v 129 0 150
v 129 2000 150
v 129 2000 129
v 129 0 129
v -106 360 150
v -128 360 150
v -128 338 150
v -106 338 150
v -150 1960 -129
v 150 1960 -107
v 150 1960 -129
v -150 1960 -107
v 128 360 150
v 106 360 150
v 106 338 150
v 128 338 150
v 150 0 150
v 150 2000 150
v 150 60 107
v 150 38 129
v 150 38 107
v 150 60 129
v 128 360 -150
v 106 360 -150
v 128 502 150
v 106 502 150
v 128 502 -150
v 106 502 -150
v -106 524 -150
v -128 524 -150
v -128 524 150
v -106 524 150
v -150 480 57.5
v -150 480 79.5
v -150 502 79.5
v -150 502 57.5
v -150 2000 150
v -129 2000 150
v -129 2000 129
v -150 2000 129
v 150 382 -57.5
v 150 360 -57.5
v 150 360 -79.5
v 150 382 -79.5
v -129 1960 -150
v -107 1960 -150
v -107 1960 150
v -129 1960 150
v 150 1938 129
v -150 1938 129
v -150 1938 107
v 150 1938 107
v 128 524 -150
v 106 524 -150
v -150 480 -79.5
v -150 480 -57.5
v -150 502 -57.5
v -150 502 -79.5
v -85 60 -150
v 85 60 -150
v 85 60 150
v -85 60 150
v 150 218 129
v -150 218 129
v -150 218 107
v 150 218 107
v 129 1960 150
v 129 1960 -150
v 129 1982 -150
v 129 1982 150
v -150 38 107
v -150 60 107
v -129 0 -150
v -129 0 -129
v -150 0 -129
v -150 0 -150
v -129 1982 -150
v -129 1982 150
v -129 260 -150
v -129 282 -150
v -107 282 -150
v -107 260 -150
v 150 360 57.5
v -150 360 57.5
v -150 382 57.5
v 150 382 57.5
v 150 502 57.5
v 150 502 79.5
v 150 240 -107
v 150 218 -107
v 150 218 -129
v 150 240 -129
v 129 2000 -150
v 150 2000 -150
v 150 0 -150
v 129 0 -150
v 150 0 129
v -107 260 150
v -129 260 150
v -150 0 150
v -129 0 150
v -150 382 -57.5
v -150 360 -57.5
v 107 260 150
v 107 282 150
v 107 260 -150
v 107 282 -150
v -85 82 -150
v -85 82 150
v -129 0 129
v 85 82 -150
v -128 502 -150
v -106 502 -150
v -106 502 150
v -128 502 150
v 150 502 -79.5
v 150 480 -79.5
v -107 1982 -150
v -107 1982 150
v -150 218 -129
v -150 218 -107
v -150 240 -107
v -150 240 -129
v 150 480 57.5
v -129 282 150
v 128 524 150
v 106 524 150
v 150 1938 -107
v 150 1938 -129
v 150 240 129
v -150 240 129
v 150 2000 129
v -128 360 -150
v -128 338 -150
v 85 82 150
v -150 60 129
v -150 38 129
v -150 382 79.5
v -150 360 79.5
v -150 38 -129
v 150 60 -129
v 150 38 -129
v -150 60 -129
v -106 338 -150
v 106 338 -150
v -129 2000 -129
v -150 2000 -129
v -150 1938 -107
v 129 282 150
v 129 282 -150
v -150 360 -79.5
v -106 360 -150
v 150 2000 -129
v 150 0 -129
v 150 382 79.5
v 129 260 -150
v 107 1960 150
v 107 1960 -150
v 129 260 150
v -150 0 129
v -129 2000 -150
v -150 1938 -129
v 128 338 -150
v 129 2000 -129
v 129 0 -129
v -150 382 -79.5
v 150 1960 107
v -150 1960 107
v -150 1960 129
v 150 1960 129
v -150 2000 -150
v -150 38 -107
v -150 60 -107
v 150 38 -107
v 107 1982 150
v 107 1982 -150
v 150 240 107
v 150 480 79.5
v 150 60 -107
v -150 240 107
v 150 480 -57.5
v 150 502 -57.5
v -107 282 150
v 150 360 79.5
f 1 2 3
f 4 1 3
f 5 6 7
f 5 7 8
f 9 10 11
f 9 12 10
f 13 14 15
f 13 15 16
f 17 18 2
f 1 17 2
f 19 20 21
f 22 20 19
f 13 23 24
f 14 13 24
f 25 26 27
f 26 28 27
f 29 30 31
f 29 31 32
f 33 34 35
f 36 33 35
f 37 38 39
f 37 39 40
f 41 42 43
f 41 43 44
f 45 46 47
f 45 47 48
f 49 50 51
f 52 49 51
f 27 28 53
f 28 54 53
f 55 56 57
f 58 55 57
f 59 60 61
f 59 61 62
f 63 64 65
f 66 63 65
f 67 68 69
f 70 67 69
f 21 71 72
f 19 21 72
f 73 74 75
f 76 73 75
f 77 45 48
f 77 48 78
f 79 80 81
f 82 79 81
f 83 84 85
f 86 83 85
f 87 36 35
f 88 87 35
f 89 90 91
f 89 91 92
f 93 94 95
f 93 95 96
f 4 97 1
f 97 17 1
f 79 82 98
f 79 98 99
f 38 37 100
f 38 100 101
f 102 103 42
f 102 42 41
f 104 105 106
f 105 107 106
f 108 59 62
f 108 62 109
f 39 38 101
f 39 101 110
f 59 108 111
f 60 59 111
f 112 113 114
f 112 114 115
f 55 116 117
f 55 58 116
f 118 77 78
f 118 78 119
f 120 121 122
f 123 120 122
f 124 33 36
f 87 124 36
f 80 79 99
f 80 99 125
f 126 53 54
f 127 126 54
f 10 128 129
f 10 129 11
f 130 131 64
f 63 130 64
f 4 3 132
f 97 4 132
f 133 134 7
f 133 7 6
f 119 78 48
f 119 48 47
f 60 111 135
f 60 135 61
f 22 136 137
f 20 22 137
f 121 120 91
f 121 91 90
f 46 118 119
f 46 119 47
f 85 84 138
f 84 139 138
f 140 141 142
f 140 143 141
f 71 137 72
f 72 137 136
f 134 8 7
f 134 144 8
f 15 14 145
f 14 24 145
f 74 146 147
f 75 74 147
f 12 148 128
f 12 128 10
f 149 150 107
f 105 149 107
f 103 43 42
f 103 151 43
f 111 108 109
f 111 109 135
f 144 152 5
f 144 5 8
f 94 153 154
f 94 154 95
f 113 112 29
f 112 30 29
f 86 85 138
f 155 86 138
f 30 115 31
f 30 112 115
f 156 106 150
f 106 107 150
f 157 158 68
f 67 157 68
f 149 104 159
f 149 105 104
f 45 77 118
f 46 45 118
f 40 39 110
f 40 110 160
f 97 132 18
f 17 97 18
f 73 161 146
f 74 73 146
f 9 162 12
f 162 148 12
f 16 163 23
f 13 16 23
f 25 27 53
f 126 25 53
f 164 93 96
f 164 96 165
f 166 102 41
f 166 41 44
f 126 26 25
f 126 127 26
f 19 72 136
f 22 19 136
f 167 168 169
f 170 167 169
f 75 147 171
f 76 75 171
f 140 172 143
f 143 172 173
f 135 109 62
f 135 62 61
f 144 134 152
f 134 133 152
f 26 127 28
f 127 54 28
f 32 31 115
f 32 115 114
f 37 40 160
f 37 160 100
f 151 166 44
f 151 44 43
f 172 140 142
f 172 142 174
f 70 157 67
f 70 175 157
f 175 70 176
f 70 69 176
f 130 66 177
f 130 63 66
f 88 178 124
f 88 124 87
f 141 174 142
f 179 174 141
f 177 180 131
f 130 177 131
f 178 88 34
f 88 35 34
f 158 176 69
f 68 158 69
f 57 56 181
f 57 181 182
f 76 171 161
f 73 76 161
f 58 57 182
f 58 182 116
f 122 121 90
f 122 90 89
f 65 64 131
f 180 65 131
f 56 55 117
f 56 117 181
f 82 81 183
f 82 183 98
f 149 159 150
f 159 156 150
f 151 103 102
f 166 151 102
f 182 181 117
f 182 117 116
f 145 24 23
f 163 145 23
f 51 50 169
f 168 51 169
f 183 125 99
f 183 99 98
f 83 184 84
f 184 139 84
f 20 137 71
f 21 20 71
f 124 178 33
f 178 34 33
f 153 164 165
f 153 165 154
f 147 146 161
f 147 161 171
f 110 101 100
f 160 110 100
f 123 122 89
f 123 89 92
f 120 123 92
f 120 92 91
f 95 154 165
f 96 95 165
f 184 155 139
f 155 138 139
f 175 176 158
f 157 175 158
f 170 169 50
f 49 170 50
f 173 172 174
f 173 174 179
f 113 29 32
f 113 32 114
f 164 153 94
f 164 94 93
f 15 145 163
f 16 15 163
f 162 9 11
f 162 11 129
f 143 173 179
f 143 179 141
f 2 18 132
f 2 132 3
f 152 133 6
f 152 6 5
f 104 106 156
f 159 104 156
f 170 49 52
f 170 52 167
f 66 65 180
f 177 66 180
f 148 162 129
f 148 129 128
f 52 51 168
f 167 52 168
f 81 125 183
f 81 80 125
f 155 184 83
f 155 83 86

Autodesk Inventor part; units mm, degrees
ref_plane "YZ Plane" through (0, 0, 0) normal (1, 0, 0) x (0, 1, 0)
ref_plane "XZ Plane" through (0, 0, 0) normal (0, 1, 0) x (-1, 0, 0)
ref_plane "XY Plane" through (0, 0, 0) normal (0, 0, 1) x (1, 0, 0)
sketch "Sketch1" plane through (0, 0, 0) normal (0, 1, 0) x (-1, 0, 0)
  line L0 (150, 150) -> (129, 150)
  line L1 (129, 150) -> (129, 129)
  line L2 (129, 129) -> (150, 129)
  line L3 (150, 129) -> (150, 150)
  line L4 (150, -150) -> (129, -150)
  line L5 (129, -150) -> (129, -129)
  line L6 (129, -129) -> (150, -129)
  line L7 (150, -129) -> (150, -150)
  line L8 (-150, -150) -> (-129, -150)
  line L9 (-129, -150) -> (-129, -129)
  line L10 (-129, -129) -> (-150, -129)
  line L11 (-150, -129) -> (-150, -150)
  line L12 (-150, 150) -> (-129, 150)
  line L13 (-129, 150) -> (-129, 129)
  line L14 (-129, 129) -> (-150, 129)
  line L15 (-150, 129) -> (-150, 150)
  line L16 (150, 129) -> (150, -129) construction
  line L17 (129, 150) -> (-129, 150) construction
  point P0 (0, 0)
  point P1 (150, 0)
  point P2 (0, 150)
  dimension "d0" = 21
  dimension "d1" = 300
  dimension "d2" = 300
extrude "Extrusion1" add sketch "Sketch1" along normal blind 2000
sketch "Sketch2" plane through (0, 0, 0) normal (1, 0, 0) x (0, 1, 0)
  line L0 (60, 129) -> (38, 129)
  line L1 (38, 129) -> (38, 107)
  line L2 (38, 107) -> (60, 107)
  line L3 (60, 107) -> (60, 129)
  line L4 (60, -129) -> (38, -129)
  line L5 (38, -129) -> (38, -107)
  line L6 (38, -107) -> (60, -107)
  line L7 (60, -107) -> (60, -129)
  line L8 (49, 107) -> (49, -107) construction
  line L9 (240, 129) -> (218, 129)
  line L10 (218, 129) -> (218, 107)
  line L11 (218, 107) -> (240, 107)
  line L12 (240, 107) -> (240, 129)
  line L13 (240, -129) -> (218, -129)
  line L14 (218, -129) -> (218, -107)
  line L15 (218, -107) -> (240, -107)
  line L16 (240, -107) -> (240, -129)
  line L17 (1960, 107) -> (1960, 129)
  line L18 (1960, 129) -> (1938, 129)
  line L19 (1938, 107) -> (1960, 107)
  line L20 (1938, 129) -> (1938, 107)
  line L21 (1960, -107) -> (1960, -129)
  line L22 (1960, -129) -> (1938, -129)
  line L23 (1938, -129) -> (1938, -107)
  line L24 (1938, -107) -> (1960, -107)
  point P0 (0, 0)
  point P1 (49, 0)
  point P2 (229, 107)
  point P3 (229, -107)
  point P4 (1949, 107)
  point P5 (1949, -107)
  dimension "d5" = 258
  dimension "d6" = 60
  dimension "d7" = 22
  dimension "d19" = 180
  dimension "d46" = 1900
extrude "Extrusion2" add sketch "Sketch2" along normal mid plane 300 separate body contours L3 L2 L1 L0 | L4 L5 L6 L7 | L19 L20 L18 L17 | L21 L22 L23 L24
sketch "Sketch3" plane through (0, 0, 0) normal (0, 0, 1) x (1, 0, 0)
  line L0 (-85, 82) -> (85, 82)
  line L1 (85, 82) -> (85, 60)
  line L2 (85, 60) -> (-85, 60)
  line L3 (-85, 60) -> (-85, 82)
  line L4 (0, 0) -> (0, 206.2216) construction
  line L5 (-129, 282) -> (-107, 282)
  line L6 (-107, 282) -> (-107, 260)
  line L7 (-107, 260) -> (-129, 260)
  line L8 (-129, 260) -> (-129, 282)
  line L9 (129, 282) -> (107, 282)
  line L10 (107, 282) -> (107, 260)
  line L11 (107, 260) -> (129, 260)
  line L12 (129, 260) -> (129, 282)
  line L13 (107, 1982) -> (107, 1960)
  line L14 (129, 1982) -> (107, 1982)
  line L15 (129, 1960) -> (129, 1982)
  line L16 (107, 1960) -> (129, 1960)
  line L17 (-107, 1982) -> (-107, 1960)
  line L18 (-129, 1982) -> (-107, 1982)
  line L19 (-129, 1960) -> (-129, 1982)
  line L20 (-107, 1960) -> (-129, 1960)
  point P0 (0, 82)
  dimension "d10" = 60
  dimension "d11" = 170
  dimension "d15" = 258
  dimension "d16" = 200
  dimension "d53" = 1700
  dimension "d61" = 22
extrude "Extrusion3" add sketch "Sketch3" along normal mid plane 300 separate body contours L0 L1 L2 L3 | L14 L15 L16 L13 | L17 L20 L19 L18
extrude "Extrusion4" add sketch "Sketch2" along normal mid plane 300 separate body contours L12 L11 L10 L9 | L13 L14 L15 L16
extrude "Extrusion5" add sketch "Sketch3" along normal mid plane 300 separate body contours L5 L6 L7 L8 | L12 L11 L10 L9
sketch "Sketch4" plane through (0, 0, 0) normal (0, 0, 1) x (1, 0, 0)
  line L0 (128, 360) -> (106, 360)
  line L1 (106, 360) -> (106, 338)
  line L2 (106, 338) -> (128, 338)
  line L3 (128, 338) -> (128, 360)
  line L4 (0, 0) -> (0, 747.9187)
  line L5 (-128, 360) -> (-106, 360)
  line L6 (-106, 360) -> (-106, 338)
  line L7 (-106, 338) -> (-128, 338)
  line L8 (-128, 338) -> (-128, 360)
  dimension "d31" = 256
  dimension "d32" = 22
  dimension "d33" = 360
extrude "Extrusion6" add sketch "Sketch4" along normal mid plane 300 separate body
sketch "Sketch5" plane through (0, 0, 0) normal (1, 0, 0) x (0, 1, 0)
  line L0 (382, 79.5) -> (360, 79.5)
  line L1 (360, 79.5) -> (360, 57.5)
  line L2 (360, 57.5) -> (382, 57.5)
  line L3 (382, 57.5) -> (382, 79.5)
  line L4 (0, 0) -> (506.9867, 0)
  line L5 (382, -79.5) -> (360, -79.5)
  line L6 (360, -79.5) -> (360, -57.5)
  line L7 (360, -57.5) -> (382, -57.5)
  line L8 (382, -57.5) -> (382, -79.5)
  dimension "d36" = 360
  dimension "d37" = 22
  dimension "d38" = 115
extrude "Extrusion7" add sketch "Sketch5" along normal mid plane 300 separate body
pattern_linear "Rectangular Pattern2" count 2 spacing 120 along (0, 1, 0) of "Extrusion7" bodies 7
pattern_linear "Rectangular Pattern3" count 2 spacing 164 along (0, 1, 0) of "Extrusion6" bodies 6
equation "\"d2\" = d1"
equation "\"d36\" = d33"
properties part number "Base listones"
